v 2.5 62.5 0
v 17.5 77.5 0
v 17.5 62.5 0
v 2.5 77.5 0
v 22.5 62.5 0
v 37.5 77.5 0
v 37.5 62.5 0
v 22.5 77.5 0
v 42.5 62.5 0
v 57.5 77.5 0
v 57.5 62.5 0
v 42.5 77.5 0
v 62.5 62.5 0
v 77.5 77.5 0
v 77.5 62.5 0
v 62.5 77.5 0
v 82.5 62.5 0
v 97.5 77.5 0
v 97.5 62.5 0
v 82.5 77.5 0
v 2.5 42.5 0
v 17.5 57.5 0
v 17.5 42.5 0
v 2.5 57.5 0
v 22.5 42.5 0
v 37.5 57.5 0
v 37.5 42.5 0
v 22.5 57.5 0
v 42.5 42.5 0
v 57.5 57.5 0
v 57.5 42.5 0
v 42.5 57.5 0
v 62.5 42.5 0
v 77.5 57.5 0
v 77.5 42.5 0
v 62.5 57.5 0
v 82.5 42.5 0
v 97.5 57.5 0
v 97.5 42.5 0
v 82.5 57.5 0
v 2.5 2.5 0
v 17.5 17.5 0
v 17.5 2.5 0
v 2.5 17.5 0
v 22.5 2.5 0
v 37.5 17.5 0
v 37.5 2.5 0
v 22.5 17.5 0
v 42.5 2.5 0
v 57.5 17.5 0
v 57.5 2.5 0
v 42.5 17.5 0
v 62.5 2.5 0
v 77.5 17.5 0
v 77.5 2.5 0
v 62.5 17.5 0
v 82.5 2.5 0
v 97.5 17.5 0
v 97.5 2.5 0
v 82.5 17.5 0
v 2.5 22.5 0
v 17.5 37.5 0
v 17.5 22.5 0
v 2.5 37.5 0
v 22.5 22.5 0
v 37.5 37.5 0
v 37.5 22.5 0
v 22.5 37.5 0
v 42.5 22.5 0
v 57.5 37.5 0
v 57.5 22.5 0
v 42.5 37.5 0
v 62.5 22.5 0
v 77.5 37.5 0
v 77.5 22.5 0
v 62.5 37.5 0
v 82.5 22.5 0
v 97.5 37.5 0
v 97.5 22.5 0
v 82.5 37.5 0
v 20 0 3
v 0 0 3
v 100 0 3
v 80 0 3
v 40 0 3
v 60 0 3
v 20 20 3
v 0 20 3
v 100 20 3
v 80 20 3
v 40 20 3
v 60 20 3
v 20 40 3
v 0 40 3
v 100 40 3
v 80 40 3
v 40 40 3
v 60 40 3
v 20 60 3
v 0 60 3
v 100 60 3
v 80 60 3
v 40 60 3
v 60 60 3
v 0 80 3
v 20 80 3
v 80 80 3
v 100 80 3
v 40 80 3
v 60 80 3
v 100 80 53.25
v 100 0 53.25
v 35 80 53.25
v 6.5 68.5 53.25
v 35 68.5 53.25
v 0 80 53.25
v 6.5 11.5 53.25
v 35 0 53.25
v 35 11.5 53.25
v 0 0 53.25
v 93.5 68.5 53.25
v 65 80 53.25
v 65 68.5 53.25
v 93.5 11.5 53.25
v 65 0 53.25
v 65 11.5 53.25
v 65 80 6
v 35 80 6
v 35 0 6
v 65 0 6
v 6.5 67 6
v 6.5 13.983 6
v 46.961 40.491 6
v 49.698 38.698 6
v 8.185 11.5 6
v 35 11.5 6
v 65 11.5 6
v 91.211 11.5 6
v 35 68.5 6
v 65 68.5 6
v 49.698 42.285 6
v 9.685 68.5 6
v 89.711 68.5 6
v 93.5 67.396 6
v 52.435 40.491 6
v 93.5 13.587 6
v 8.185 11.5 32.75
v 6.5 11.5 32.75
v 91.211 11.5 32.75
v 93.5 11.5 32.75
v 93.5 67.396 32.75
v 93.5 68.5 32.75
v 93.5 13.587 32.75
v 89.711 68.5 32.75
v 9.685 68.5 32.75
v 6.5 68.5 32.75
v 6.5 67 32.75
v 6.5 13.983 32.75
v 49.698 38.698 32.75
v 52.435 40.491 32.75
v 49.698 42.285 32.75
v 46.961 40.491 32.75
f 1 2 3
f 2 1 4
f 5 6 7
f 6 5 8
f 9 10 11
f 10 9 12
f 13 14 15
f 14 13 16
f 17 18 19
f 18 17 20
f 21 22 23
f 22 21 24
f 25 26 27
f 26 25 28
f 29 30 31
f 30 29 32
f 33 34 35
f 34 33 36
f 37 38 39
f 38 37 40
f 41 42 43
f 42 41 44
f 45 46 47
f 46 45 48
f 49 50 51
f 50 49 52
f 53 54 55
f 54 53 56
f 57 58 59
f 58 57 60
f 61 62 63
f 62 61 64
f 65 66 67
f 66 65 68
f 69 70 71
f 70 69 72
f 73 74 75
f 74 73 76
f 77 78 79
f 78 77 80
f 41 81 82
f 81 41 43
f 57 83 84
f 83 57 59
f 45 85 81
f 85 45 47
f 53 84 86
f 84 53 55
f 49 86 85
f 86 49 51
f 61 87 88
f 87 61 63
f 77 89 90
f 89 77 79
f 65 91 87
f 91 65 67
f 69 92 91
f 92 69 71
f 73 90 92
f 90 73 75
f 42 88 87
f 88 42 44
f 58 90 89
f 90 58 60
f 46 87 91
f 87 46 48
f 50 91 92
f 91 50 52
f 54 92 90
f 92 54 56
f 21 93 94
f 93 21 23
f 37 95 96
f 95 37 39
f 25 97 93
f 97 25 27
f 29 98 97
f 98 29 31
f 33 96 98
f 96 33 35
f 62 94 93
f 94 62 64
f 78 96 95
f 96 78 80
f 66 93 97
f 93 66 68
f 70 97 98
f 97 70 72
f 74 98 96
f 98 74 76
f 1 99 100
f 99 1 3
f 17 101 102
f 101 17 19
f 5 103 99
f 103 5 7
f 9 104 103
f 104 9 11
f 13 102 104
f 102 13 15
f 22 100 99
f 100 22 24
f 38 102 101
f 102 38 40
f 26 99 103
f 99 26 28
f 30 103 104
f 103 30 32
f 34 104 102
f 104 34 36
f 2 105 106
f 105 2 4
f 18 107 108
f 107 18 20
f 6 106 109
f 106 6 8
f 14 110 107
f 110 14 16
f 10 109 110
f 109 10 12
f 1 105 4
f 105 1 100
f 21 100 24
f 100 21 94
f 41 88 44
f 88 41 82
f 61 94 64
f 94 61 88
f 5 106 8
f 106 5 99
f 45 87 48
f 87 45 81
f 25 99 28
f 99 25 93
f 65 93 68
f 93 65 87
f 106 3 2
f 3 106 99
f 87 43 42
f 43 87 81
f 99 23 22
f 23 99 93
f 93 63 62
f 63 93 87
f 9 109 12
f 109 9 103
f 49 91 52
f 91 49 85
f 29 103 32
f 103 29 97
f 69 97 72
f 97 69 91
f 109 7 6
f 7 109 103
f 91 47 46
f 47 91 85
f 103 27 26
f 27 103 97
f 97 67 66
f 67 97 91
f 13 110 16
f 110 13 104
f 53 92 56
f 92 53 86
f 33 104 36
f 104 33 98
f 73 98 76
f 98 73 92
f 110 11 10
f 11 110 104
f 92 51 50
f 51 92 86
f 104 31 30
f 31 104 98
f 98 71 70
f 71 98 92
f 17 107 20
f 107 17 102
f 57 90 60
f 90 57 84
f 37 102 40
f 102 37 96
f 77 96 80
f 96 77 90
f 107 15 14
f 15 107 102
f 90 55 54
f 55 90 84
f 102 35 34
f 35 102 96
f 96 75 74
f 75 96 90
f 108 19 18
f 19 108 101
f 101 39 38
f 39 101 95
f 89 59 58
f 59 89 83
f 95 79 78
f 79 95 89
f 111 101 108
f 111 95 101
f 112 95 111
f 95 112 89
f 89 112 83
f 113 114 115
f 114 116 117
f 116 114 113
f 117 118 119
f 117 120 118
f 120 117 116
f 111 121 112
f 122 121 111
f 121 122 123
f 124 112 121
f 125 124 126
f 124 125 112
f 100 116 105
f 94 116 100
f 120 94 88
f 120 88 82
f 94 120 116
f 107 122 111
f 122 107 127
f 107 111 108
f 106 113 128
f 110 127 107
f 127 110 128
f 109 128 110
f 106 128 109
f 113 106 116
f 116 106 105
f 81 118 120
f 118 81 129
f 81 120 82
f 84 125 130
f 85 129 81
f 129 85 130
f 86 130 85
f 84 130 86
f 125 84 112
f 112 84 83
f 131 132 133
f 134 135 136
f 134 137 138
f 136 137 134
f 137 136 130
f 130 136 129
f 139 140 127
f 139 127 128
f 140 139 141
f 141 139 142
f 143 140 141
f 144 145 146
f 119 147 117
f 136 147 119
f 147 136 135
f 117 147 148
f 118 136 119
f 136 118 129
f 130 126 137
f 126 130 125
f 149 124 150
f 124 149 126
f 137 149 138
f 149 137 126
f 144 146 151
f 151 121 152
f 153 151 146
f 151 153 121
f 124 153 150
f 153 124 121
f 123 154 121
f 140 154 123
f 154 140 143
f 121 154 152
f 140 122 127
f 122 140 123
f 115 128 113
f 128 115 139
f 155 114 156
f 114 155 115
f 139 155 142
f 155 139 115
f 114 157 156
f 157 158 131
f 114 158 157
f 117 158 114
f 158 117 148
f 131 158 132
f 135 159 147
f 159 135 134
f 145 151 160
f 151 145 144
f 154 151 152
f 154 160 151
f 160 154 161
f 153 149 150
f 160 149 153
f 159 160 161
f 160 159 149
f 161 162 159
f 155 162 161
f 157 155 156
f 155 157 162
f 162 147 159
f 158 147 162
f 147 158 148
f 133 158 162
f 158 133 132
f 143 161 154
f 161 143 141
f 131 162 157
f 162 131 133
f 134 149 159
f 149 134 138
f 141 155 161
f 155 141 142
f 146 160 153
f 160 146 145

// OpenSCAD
// file: ../common.scad
BASE_TILE_SIZE=20;
BASE_WIDTH=5;
PEAK_HEIGHT=3;

function y_up() = [90, 0, 0];
function x_up() = [90, 0, 90];

function min_floor_offset(wall_width) = wall_width + PEAK_HEIGHT;
function tri_mid() = BASE_WIDTH / 2;
function triangle() = [[0, 0],[BASE_WIDTH, 0],[tri_mid(), PEAK_HEIGHT]];
function base_tile_size() = BASE_TILE_SIZE;
function peak_height() = PEAK_HEIGHT;

function isX(direction) = (direction == "x");

module grid(width, depth, direction) {
    length = isX(direction) ? width : depth;
    slot_length = isX(direction) ? depth : width;
    translate_z = isX(direction) ? -slot_length : 0;
    rot = isX(direction) ? y_up() : x_up();

    // This is the total additional slots past the initial one
    total_slots = floor(length / BASE_TILE_SIZE);

    for (i = [0 : total_slots]) {
        offset = -tri_mid() + BASE_TILE_SIZE * i;
        rotate(rot)
        translate([offset, 0, translate_z])
        linear_extrude(height = slot_length)
        polygon(points=triangle());
    }
}

module grid_slots(width, depth) {
    grid(width, depth, "y");
    grid(width, depth, "x");
}

module base_block(width, depth, height) {
    difference() {
        cube([width, depth, height]);
        grid_slots(width, depth);
    }
}
// file: ../chip_holder.scad
use <common.scad>

MAX_THUMB_WIDTH = 30;
WAY_DEEP = 100;

module generate_holder(
    tile_columns = 4,
    tile_rows = 2,
    tile_width = 33,
    tile_depth = 33,
    tile_count = 20,
    tile_height = 1.75,
    wall_width = 3,
    box_height = 69,
    box_clearence = 15.75,
    rount_to_full_base = true,
    fit_to_box_height = true,
    hollow_bottom = false
) {
    function getSize(count, tile_size) = count * (tile_size + wall_width) + wall_width;
    function roundFullBase(count, tile_size) = (rount_to_full_base) ? ceil(getSize(count, tile_size) / base_tile_size()) * base_tile_size() : getSize(count, tile_size);
    function max_height() = box_height - box_clearence;

    slot_height = tile_count * tile_height;
    min_floor_offset = min_floor_offset(wall_width);
    min_height = slot_height + min_floor_offset;
    total_height = (fit_to_box_height) ? max(max_height(), min_height) : min_height;
    inside_height = (hollow_bottom) ? total_height - min_floor_offset : slot_height;
    floor_offset = (fit_to_box_height) ? max_height() - inside_height : min_floor_offset;

    total_width = roundFullBase(tile_columns, tile_width);
    total_depth = roundFullBase(tile_rows, tile_depth);

    row_width = tile_depth * tile_rows;
    col_width = tile_width * tile_columns;
    outside_walls = wall_width * 2;

    col_spread = (tile_columns > 1) ? (total_width - col_width - outside_walls) / (tile_columns - 1) : 0;
    row_spread = (tile_rows > 1) ? (total_depth - row_width - outside_walls) / (tile_rows - 1) : 0;

    function colOffset(i) = (tile_columns == 1) ?
        (total_width - tile_width) / 2 :
        wall_width + ((tile_width + col_spread) * i);
    function rowOffset(i) = (tile_rows == 1) ?
        (total_depth - tile_depth) / 2 :
        wall_width + ((tile_depth + row_spread) * i);

    module tile_slot() {
        translate([0, 0, 0])
        square([tile_width, tile_depth]);
    }

    module thumb_slot_front() {
        width = min(tile_width - (wall_width * 2), MAX_THUMB_WIDTH);
        side_offset = (tile_width - width) / 2;
        translate([side_offset, -WAY_DEEP, 0])
        square([width, WAY_DEEP]);
    }

    module thumb_slot_back() {
        width = min(tile_width - (wall_width * 2), MAX_THUMB_WIDTH);
        side_offset = (tile_width - width) / 2;
        translate([side_offset, tile_depth, 0])
        square([width, WAY_DEEP]);
    }

    module tile_hole(slot_type = "none") {
        box_bottom = floor_offset;
        translate([0, 0, box_bottom])
        linear_extrude(height = inside_height)
        union() {
            tile_slot();
            if (slot_type == "front" || slot_type == "both") {
                thumb_slot_front();
            }

            if (slot_type == "back" || slot_type == "both") {
                thumb_slot_back();
            }
        }
    }

    module tile_holes() {
        for (i = [0 : tile_rows - 1]) {
            for (j = [0 : tile_columns - 1]) {
                slot_type = (tile_rows == 1) ? "both" : (i == 0) ? "front" : (i == tile_rows - 1) ? "back" : "none";
                col_offset = colOffset(j);
                row_offset = rowOffset(i);

                translate([col_offset, row_offset, 0])
                tile_hole(slot_type = slot_type);
            }
        }
    }

    module bottom_x() {
        if (hollow_bottom) {
            for (i = [0 : tile_rows - 1]) {
                for (j = [0 : tile_columns - 1]) {
                    length = sqrt(pow(tile_width, 2) + pow(tile_depth, 2));
                    rot = acos(tile_depth / length);
                    x_height = inside_height - slot_height;
                    z_offset = min_floor_offset(wall_width);

                    col_offset = colOffset(j);
                    row_offset = rowOffset(i);

                    translate([col_offset - wall_width / 2, row_offset + wall_width / 2, z_offset])
                    rotate([0, 0, -rot])
                    cube([wall_width, length + wall_width, x_height]);

                    translate([col_offset + tile_width, row_offset - wall_width / 2, z_offset])
                    rotate([0, 0, rot])
                    cube([wall_width, length + wall_width, x_height]);
                }
            }
        }
    }

    union() {
        difference() {
            base_block(total_width, total_depth, total_height);
            tile_holes();
        }
        bottom_x();
    }
}
// file: common.scad
WALL_WIDTH = 3;
BOX_HEIGHT = 69;
BOX_CLEARENCE = 15.75;

function wall_width() = WALL_WIDTH;
function box_height() = BOX_HEIGHT;
function box_clearence() = BOX_CLEARENCE;
// main file
use <common.scad>
use <../chip_holder.scad>

generate_holder(
    tile_columns = 1,
    tile_rows = 1,
    tile_width = 87,
    tile_depth = 57,
    tile_count = 1,
    tile_height = 20.5,
    wall_width = wall_width(),
    box_height = box_height(),
    box_clearence = box_clearence(),
    rount_to_full_base = true,
    fit_to_box_height = true,
    hollow_bottom = true
);
